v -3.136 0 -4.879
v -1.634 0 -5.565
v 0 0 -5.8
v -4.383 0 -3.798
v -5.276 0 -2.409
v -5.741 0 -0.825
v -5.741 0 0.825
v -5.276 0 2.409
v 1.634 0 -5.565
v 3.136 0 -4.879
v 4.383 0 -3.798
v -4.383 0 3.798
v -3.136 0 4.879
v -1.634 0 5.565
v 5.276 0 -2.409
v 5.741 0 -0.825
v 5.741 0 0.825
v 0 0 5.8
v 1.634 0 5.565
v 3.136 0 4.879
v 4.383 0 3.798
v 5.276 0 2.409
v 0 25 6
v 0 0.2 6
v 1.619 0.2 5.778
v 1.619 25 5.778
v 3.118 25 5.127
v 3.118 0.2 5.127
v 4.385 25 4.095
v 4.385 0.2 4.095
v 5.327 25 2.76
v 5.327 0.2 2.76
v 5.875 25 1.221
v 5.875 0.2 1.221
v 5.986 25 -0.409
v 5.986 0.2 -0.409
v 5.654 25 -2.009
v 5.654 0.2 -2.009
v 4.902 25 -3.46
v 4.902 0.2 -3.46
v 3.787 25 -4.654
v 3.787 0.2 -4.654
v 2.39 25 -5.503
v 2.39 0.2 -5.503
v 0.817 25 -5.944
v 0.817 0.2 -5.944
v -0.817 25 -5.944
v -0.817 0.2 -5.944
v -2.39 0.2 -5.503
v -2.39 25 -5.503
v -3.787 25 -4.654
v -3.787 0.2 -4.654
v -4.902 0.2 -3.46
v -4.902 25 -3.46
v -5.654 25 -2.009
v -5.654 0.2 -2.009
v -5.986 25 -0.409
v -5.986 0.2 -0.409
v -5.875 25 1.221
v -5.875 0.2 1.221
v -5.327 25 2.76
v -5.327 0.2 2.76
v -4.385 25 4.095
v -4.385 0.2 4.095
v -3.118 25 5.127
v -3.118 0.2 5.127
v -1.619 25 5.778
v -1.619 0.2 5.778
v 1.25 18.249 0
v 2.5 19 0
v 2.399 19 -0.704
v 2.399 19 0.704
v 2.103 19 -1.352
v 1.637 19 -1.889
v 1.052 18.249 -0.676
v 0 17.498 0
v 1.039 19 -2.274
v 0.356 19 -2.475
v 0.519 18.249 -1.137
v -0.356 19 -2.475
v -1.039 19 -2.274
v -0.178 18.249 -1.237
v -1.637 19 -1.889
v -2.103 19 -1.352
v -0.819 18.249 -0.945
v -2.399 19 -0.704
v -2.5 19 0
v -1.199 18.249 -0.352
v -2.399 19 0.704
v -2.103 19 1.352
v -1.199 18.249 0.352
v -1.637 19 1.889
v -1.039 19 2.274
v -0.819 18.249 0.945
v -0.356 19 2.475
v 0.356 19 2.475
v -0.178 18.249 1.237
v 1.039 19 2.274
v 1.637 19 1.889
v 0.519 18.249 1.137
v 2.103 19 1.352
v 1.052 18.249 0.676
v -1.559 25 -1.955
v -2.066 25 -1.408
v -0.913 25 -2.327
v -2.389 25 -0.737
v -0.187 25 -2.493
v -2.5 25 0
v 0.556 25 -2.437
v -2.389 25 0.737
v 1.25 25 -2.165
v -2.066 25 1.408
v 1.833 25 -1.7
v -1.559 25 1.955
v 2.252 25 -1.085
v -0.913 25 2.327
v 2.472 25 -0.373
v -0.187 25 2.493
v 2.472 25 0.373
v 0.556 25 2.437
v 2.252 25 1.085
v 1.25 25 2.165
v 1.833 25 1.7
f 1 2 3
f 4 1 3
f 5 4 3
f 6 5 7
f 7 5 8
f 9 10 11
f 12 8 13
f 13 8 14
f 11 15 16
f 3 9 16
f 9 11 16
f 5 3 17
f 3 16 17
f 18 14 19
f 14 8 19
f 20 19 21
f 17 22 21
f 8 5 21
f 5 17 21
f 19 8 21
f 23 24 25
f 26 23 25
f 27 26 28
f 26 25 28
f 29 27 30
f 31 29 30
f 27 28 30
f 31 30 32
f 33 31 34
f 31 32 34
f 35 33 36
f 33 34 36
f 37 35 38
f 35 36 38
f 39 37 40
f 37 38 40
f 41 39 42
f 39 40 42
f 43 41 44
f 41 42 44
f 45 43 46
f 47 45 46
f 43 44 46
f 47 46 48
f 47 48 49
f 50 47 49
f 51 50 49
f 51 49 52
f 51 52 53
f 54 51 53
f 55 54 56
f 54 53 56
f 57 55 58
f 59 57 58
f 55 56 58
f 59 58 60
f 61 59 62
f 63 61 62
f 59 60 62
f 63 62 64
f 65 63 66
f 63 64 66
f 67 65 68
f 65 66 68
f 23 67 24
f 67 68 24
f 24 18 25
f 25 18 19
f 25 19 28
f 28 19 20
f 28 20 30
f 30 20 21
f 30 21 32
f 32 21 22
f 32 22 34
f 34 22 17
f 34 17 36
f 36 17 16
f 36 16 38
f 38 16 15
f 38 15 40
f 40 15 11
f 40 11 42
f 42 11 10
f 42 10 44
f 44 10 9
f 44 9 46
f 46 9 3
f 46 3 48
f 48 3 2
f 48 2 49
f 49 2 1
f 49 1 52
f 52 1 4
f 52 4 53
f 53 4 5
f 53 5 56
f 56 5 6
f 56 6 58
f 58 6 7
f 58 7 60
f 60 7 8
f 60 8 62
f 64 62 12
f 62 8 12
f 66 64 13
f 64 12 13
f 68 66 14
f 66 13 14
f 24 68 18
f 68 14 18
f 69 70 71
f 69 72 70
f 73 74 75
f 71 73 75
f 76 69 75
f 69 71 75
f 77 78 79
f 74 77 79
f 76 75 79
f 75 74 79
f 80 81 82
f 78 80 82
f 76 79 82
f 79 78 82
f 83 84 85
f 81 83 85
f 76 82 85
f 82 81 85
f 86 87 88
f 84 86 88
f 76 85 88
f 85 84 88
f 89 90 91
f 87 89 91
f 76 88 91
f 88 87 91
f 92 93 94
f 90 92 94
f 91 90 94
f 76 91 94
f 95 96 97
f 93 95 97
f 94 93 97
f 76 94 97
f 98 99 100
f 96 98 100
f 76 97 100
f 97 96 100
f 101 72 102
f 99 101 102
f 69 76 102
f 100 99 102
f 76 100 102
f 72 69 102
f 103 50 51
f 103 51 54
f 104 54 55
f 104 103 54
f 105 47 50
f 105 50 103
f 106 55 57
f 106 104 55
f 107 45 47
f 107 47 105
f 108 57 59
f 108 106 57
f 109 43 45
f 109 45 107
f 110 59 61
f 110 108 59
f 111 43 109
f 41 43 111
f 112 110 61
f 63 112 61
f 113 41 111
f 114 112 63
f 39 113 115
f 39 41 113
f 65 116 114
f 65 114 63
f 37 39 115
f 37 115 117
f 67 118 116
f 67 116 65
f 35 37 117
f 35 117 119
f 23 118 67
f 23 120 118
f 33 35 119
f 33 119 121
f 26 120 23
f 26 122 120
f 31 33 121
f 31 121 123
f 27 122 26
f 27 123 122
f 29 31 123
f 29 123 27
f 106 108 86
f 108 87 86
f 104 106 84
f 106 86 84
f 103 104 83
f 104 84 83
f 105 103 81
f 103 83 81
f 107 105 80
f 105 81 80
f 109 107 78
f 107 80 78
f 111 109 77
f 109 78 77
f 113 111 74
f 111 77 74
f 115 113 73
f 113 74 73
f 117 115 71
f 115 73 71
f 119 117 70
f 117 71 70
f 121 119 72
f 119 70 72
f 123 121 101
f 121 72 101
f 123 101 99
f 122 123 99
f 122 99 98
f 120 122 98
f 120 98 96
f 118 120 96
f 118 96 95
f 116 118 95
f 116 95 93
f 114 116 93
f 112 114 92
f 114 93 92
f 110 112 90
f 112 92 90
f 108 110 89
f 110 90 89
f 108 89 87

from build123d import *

# Parameters (mm, degrees)
SKETCH_1_R      = 6
EXTRUDE_1_DEPTH = 25
M6X1_0_1_D      = 5
M6X1_0_1_DEPTH  = 6
M6X1_0_1_TIP    = 1.502151548
CHAMFER_1_SIZE  = 0.2


with BuildPart() as part:
    # 草图1 → 凸台-拉伸1 (new body)
    with BuildSketch(Plane(origin=(0, 0, 0), x_dir=(1, 0, 0), z_dir=(0, 1, 0))):
        with Locations(Location((0, 0, 0), (0, 0, 270))):
            Circle(SKETCH_1_R)
    extrude(amount=EXTRUDE_1_DEPTH)

    # M6x1.0 螺纹孔1
    with Locations(Plane(origin=(0, 25, 0), x_dir=(1, 0, 0), z_dir=(0, 1, 0))):
        with Locations((0, 0)):
            Hole(M6X1_0_1_D / 2, depth=M6X1_0_1_DEPTH)
            with Locations((0, 0, -(M6X1_0_1_DEPTH + M6X1_0_1_TIP / 2))):  # 118° drill point
                Cone(0, M6X1_0_1_D / 2, M6X1_0_1_TIP, mode=Mode.SUBTRACT)

    # 倒角1
    chamfer_1_edges = [part.edges().sort_by_distance(p)[0] for p in [
        (0, 0, -6),
    ]]
    chamfer(chamfer_1_edges, length=CHAMFER_1_SIZE)


solid = part.part
